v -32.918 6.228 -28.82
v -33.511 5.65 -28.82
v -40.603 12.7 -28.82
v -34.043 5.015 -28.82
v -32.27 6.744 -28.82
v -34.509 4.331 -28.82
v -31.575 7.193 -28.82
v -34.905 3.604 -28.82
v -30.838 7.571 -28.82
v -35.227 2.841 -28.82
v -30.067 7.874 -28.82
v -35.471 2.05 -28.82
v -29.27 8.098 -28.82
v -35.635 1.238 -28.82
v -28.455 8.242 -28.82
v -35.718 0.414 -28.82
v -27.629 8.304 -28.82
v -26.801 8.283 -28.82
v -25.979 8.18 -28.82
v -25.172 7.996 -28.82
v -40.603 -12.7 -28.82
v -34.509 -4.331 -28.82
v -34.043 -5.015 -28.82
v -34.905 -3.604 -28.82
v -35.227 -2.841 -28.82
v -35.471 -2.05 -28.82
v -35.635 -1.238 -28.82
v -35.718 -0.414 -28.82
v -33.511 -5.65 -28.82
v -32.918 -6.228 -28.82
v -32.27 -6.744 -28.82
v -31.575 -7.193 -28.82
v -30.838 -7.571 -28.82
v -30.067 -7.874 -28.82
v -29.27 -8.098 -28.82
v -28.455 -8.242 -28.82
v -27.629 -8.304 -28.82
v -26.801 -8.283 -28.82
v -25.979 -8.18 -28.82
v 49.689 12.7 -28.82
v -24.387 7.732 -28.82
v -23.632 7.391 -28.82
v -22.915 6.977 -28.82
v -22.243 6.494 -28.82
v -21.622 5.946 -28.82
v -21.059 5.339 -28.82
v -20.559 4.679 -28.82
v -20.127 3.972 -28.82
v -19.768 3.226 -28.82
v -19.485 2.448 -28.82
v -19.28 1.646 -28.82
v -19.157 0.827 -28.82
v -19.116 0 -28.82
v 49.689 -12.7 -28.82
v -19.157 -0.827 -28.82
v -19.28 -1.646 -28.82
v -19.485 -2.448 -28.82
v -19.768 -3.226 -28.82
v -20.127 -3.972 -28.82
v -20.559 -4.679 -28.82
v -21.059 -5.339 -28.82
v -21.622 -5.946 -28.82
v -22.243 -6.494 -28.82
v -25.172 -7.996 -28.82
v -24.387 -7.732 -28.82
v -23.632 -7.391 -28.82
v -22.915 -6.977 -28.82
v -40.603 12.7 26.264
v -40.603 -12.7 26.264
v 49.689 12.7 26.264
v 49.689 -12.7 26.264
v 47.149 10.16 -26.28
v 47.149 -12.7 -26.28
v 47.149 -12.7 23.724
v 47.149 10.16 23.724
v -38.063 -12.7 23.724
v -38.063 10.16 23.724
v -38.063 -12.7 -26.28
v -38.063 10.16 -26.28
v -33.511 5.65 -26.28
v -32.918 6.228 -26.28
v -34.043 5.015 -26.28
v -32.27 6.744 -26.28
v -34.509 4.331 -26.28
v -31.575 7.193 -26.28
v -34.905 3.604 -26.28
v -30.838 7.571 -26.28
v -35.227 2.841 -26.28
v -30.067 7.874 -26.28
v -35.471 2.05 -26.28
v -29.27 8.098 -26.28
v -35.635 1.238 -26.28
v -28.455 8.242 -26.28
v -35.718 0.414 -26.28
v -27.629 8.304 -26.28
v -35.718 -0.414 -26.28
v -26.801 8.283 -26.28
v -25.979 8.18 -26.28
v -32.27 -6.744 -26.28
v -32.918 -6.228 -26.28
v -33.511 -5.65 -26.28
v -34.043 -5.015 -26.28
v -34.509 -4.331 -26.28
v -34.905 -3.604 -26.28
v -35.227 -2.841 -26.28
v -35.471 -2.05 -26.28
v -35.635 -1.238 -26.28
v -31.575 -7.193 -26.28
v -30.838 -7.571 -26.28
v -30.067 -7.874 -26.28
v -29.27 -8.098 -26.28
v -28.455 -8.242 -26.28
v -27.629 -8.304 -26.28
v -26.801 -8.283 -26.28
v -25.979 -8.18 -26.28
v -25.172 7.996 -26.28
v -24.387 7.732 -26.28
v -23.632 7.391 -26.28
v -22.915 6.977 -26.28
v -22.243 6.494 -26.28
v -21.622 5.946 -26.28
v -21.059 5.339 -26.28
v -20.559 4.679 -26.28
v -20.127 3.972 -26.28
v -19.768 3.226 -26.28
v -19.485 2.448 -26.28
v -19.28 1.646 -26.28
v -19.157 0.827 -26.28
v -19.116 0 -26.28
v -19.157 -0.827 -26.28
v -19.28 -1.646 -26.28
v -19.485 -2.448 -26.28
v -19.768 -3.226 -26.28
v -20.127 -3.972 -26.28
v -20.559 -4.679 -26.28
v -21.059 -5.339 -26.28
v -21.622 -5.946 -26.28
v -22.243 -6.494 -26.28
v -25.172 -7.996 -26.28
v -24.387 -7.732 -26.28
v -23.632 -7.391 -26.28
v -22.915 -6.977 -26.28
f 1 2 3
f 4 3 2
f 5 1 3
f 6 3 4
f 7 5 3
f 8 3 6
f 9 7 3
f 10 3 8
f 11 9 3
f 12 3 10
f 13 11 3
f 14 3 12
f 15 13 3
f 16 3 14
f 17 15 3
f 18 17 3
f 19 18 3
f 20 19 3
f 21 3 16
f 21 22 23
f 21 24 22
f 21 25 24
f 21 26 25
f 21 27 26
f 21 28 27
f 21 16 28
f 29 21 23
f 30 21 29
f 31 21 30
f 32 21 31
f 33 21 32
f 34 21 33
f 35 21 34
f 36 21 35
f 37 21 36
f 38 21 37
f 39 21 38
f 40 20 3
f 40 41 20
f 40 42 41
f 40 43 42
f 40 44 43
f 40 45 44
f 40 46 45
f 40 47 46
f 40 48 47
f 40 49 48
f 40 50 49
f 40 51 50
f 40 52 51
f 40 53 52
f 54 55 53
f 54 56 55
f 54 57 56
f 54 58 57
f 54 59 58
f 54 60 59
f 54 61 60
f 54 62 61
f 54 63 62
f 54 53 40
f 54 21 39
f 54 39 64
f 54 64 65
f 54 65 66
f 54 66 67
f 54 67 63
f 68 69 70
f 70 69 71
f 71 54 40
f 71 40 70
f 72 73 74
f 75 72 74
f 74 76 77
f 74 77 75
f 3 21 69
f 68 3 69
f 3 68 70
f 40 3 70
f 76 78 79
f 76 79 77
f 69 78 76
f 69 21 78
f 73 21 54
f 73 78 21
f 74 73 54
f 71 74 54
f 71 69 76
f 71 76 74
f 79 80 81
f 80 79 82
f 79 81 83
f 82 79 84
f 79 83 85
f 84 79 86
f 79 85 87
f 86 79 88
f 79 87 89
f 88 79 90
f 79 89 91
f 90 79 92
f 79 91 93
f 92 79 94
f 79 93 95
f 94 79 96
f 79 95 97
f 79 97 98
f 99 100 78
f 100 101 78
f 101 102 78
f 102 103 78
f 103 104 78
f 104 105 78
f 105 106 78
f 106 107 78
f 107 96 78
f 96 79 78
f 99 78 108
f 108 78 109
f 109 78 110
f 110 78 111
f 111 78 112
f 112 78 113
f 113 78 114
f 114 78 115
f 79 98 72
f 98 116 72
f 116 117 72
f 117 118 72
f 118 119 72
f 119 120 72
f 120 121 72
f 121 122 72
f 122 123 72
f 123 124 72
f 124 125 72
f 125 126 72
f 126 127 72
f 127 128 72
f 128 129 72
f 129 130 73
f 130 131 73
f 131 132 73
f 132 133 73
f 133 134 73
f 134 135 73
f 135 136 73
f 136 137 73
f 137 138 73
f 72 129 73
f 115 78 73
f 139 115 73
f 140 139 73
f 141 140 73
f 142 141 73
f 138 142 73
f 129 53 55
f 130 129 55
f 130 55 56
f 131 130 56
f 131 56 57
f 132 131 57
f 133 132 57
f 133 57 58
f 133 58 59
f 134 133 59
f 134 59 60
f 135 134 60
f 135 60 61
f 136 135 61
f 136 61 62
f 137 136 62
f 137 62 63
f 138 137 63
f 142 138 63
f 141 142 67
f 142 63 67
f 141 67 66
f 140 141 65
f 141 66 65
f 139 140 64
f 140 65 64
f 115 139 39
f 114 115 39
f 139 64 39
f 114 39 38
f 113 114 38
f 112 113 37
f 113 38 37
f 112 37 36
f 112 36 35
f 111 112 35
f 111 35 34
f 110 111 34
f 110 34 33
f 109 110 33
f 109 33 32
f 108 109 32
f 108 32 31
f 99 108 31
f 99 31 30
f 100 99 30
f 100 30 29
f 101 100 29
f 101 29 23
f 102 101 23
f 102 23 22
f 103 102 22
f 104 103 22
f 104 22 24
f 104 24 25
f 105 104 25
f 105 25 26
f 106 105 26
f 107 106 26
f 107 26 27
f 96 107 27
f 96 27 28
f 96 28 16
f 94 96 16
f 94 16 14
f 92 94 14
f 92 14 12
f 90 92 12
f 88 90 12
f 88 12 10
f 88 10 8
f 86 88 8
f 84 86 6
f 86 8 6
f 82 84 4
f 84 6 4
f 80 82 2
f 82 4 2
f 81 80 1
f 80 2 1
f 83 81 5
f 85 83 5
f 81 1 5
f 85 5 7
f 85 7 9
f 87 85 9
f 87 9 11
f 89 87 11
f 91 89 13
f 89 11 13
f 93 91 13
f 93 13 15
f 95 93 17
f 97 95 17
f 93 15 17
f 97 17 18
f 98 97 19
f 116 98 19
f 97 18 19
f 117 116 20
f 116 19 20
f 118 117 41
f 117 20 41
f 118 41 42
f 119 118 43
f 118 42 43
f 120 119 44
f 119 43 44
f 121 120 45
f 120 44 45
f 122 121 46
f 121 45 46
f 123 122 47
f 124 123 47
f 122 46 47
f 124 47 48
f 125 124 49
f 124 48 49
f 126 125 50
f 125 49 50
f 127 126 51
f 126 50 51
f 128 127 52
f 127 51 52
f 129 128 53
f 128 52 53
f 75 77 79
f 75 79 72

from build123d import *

# Parameters (mm, degrees)
F0_W     = 90.2919955552
F0_H     = 55.083796382
F1_DEPTH = 12.7
F2_T     = -2.54
F3_R     = 8.3062100312
F4_DEPTH = 25.4


with BuildPart() as f1:
    # F0 (on Front) → F1 (new body, symmetric)
    with BuildSketch(Plane.XZ):
        with Locations((4.5429933816, -1.2777205557)):
            Rectangle(F0_W, F0_H)
    extrude(amount=F1_DEPTH, both=True)

    # F2
    f2_openings = [f1.faces().sort_by_distance(p)[0] for p in [
        (4.542993, -12.7, -1.277721),
    ]]
    offset(amount=F2_T, openings=f2_openings)

    # F3 (on face) → F4 (cut)
    with BuildSketch(Plane(origin=(0, 0, -28.8196187466), x_dir=(1, 0, 0), z_dir=(0, 0, -1))):
        with Locations((-27.4217892438, 0)):
            Circle(F3_R)
    extrude(amount=-F4_DEPTH, mode=Mode.SUBTRACT)


solid = f1.part
